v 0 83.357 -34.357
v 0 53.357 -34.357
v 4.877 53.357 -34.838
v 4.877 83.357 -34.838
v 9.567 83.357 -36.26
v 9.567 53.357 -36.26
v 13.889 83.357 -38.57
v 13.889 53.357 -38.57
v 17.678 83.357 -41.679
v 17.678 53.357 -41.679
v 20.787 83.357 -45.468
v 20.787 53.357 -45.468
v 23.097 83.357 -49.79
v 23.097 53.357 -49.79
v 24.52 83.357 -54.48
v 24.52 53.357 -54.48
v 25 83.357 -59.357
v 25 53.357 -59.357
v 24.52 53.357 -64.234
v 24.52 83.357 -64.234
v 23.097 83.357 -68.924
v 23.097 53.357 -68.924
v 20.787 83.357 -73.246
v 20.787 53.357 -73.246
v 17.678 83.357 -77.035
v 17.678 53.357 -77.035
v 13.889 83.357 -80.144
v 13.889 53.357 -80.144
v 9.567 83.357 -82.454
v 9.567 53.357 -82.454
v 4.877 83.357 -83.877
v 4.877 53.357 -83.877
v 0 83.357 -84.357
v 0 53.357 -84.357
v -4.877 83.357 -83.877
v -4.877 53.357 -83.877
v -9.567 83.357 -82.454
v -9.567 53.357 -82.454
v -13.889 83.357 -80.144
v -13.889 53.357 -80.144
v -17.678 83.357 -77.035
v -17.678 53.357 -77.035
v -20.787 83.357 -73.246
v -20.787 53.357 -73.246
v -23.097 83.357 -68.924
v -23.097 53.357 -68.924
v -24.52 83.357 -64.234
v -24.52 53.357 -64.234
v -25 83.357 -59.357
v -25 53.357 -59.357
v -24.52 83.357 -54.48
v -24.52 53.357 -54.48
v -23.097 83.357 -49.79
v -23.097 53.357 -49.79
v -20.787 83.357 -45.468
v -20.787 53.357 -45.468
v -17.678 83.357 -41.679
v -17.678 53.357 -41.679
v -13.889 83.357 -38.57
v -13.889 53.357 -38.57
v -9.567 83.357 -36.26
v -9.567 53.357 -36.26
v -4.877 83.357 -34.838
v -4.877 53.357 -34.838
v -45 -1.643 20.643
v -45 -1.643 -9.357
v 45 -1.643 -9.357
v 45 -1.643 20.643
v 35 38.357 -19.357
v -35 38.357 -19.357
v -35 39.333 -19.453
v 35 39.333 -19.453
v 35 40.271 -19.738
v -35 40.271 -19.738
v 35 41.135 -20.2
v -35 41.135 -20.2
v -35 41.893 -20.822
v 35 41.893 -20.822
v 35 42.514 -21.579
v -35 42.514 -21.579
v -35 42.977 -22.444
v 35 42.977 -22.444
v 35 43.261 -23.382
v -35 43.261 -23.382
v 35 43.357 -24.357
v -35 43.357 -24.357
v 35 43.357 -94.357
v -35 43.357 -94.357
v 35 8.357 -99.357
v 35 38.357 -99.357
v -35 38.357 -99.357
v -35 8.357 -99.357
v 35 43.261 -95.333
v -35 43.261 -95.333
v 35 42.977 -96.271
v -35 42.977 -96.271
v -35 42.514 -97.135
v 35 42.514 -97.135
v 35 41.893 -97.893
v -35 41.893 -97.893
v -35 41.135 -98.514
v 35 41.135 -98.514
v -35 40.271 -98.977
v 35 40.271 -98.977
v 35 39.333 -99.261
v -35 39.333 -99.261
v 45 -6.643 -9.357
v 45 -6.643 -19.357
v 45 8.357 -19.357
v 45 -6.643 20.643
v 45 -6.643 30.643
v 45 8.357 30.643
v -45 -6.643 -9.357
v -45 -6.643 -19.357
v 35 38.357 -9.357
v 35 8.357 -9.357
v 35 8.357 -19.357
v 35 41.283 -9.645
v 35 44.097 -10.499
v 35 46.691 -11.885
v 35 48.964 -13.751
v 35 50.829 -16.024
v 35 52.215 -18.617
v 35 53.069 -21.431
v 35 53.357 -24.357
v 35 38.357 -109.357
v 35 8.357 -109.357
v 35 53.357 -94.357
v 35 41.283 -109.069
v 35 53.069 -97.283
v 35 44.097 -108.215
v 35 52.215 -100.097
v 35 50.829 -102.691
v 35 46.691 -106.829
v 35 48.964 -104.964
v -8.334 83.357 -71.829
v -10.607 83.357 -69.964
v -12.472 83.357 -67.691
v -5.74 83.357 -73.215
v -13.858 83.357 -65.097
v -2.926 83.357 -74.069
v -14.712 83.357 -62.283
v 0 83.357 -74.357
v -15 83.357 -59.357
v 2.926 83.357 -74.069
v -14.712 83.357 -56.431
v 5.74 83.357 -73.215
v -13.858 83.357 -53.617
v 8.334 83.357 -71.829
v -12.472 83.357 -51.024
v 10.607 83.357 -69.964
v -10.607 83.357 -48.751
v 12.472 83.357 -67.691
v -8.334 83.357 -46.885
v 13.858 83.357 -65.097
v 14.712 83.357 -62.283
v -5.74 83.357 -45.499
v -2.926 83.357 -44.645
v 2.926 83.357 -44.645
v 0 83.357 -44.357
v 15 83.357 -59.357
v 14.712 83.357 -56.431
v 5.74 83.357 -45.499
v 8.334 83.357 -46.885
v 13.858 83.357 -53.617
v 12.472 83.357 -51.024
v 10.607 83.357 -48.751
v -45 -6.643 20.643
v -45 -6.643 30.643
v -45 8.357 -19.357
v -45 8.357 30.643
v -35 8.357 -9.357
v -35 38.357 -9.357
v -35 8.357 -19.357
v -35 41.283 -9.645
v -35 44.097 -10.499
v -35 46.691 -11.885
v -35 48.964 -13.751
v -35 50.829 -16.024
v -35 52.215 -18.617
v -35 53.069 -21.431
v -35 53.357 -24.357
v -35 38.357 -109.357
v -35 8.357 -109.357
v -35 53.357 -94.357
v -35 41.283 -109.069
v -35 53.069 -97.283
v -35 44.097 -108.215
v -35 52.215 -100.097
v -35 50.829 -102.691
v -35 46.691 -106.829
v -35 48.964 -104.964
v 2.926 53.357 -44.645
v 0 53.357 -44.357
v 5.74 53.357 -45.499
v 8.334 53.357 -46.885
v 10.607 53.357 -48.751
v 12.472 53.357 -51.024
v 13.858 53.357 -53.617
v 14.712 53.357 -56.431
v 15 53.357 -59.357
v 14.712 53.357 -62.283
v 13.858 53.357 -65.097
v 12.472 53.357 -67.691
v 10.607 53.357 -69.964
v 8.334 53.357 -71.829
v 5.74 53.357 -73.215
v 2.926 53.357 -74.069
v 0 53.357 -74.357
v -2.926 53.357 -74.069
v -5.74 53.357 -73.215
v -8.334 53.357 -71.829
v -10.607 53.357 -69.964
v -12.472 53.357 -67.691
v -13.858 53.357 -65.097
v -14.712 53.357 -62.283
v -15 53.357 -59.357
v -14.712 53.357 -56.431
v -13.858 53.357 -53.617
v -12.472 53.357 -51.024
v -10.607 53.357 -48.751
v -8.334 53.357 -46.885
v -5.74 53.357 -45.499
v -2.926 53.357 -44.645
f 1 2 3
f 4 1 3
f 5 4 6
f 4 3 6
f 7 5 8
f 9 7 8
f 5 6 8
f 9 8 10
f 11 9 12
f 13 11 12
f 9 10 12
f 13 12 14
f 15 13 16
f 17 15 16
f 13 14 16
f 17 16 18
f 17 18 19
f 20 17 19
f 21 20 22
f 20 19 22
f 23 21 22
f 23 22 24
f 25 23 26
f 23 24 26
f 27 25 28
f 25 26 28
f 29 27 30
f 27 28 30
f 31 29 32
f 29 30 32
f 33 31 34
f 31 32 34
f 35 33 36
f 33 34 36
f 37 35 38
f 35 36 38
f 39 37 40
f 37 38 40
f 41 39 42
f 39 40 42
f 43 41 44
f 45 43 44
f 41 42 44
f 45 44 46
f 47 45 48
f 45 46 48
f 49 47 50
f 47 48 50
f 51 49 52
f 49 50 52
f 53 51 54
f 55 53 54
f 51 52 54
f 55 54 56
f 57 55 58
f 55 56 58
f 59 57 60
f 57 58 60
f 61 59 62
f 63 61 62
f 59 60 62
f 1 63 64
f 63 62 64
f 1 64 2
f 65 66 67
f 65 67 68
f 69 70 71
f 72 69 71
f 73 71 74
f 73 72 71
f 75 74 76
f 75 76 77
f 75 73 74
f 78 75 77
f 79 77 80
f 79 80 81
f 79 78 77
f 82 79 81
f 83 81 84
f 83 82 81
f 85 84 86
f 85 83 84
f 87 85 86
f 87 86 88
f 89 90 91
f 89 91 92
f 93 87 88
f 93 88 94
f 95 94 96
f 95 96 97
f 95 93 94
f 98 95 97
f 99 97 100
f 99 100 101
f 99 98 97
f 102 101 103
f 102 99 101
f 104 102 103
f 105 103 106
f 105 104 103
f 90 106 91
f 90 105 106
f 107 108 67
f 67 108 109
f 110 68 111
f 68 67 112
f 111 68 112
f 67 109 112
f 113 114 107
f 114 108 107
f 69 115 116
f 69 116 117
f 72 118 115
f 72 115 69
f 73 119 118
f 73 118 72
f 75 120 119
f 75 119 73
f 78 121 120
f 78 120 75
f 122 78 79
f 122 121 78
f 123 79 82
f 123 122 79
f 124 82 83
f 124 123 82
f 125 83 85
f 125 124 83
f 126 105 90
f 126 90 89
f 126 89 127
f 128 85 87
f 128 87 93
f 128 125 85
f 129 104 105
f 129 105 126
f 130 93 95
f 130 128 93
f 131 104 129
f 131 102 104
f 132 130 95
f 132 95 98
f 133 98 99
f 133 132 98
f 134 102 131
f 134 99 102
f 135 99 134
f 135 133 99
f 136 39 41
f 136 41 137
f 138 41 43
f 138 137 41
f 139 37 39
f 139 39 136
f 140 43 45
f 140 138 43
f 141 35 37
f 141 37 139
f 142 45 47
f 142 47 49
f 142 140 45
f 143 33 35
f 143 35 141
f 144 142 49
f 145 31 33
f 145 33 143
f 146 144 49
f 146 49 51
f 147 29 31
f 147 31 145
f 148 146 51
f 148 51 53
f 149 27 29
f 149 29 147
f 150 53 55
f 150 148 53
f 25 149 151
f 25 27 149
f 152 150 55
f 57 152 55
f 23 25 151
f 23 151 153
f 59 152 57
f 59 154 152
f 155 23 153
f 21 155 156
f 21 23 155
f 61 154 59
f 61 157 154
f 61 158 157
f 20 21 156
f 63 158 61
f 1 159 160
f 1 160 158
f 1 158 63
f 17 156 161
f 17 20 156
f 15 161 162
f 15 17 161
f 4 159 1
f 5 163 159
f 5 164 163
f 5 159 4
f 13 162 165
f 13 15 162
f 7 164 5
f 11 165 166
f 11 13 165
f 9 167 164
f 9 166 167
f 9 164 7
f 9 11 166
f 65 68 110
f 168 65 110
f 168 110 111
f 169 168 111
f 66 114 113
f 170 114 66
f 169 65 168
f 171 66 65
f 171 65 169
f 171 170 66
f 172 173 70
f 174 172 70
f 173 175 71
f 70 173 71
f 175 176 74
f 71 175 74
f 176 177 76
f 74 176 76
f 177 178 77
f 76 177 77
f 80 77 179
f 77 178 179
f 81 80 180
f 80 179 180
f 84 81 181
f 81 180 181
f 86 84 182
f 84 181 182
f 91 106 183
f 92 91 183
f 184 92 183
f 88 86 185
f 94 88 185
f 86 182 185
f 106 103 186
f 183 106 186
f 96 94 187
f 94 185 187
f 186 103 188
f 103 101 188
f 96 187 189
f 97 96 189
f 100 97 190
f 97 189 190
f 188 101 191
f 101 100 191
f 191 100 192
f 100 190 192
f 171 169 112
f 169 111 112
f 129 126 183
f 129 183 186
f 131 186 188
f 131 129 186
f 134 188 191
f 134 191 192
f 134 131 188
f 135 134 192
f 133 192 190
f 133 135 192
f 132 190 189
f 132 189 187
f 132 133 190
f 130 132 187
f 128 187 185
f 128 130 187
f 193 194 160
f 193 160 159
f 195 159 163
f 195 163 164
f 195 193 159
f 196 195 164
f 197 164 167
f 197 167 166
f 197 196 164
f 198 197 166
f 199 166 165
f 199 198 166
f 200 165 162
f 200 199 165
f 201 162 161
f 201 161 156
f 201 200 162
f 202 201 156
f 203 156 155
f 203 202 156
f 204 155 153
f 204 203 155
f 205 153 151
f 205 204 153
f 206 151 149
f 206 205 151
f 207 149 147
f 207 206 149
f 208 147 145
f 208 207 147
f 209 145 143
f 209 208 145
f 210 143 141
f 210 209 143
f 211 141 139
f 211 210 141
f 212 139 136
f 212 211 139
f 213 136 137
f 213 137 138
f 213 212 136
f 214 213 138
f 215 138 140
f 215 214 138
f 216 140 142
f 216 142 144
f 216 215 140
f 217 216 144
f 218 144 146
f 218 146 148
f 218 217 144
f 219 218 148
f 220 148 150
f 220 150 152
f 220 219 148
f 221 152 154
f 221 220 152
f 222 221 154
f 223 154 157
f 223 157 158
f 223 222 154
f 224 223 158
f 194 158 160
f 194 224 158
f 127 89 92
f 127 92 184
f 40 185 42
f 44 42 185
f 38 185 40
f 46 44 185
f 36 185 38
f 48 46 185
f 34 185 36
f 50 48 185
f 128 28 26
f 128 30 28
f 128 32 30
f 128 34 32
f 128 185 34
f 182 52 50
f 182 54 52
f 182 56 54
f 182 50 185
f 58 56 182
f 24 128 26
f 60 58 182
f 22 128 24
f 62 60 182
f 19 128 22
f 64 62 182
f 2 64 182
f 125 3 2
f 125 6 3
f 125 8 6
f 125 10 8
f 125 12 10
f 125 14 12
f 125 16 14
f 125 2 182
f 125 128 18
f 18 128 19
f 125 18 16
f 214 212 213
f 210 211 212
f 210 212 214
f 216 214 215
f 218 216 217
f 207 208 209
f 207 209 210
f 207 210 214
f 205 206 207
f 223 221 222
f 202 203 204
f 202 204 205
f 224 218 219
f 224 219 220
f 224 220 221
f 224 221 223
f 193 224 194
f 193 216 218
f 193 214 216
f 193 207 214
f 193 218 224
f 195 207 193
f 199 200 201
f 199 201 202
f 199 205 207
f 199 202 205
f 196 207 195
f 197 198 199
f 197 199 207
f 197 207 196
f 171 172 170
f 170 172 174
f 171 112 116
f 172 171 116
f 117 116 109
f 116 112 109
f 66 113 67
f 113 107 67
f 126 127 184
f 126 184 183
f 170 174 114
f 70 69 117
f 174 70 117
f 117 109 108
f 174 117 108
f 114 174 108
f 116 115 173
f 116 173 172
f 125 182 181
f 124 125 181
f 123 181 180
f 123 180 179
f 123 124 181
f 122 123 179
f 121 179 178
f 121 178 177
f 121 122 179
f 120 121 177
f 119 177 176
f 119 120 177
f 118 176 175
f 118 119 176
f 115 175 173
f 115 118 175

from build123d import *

# Parameters (mm, degrees)
BOSS_EXTRUDE1_DEPTH = 45
BOSS_EXTRUDE2_START = -10
BOSS_EXTRUDE2_DEPTH = 70
SKETCH3_R           = 25
SKETCH3_R_2         = 15
BOSS_EXTRUDE3_DEPTH = 30


with BuildPart() as part:
    # Sketch1 → Boss-Extrude1 (new, symmetric)
    with BuildSketch(Plane(origin=(0, 0, 0), x_dir=(0, 0, -1), z_dir=(1, 0, 0))):
        Polygon((-20.642857143, -6.642857143), (-30.642857143, -6.642857143), (-30.642857143, 8.357142857), (19.357142857, 8.357142857), (19.357142857, -6.642857143), (9.357142857, -6.642857143), (9.357142857, -1.642857143), (-20.642857143, -1.642857143), align=None)
    extrude(amount=BOSS_EXTRUDE1_DEPTH, both=True)

    # Sketch2 → Boss-Extrude2 (add)
    with BuildSketch(Plane(origin=(45, 0, 0), x_dir=(0, 0, -1), z_dir=(1, 0, 0)).offset(BOSS_EXTRUDE2_START)):
        with BuildLine():
            Line((19.357142857, 8.357142857), (19.357142857, 38.357142857))
            ThreePointArc((19.357142857, 38.357142857), (20.821608951, 41.892676763), (24.357142857, 43.357142857))
            Line((24.357142857, 43.357142857), (94.357142857, 43.357142857))
            ThreePointArc((94.357142857, 43.357142857), (97.892676763, 41.892676763), (99.357142857, 38.357142857))
            Line((99.357142857, 38.357142857), (99.357142857, 8.357142857))
            Line((99.357142857, 8.357142857), (109.357142857, 8.357142857))
            Line((109.357142857, 8.357142857), (109.357142857, 38.357142857))
            ThreePointArc((109.357142857, 38.357142857), (104.963744575, 48.963744575), (94.357142857, 53.357142857))
            Line((94.357142857, 53.357142857), (24.357142857, 53.357142857))
            ThreePointArc((24.357142857, 53.357142857), (13.750541139, 48.963744575), (9.357142857, 38.357142857))
            Line((9.357142857, 38.357142857), (9.357142857, 8.357142857))
            Line((9.357142857, 8.357142857), (19.357142857, 8.357142857))
        make_face()
    extrude(amount=-BOSS_EXTRUDE2_DEPTH)

    # Sketch3 → Boss-Extrude3 (add)
    with BuildSketch(Plane(origin=(0, 53.357142857, 0), x_dir=(1, 0, 0), z_dir=(0, 1, 0))):
        with Locations(Location((0, 59.357142857, 0), (0, 0, 270))):
            Circle(SKETCH3_R)
        with Locations(Location((0, 59.357142857, 0), (0, 0, 270))):
            Circle(SKETCH3_R_2, mode=Mode.SUBTRACT)
    extrude(amount=BOSS_EXTRUDE3_DEPTH)


solid = part.part
